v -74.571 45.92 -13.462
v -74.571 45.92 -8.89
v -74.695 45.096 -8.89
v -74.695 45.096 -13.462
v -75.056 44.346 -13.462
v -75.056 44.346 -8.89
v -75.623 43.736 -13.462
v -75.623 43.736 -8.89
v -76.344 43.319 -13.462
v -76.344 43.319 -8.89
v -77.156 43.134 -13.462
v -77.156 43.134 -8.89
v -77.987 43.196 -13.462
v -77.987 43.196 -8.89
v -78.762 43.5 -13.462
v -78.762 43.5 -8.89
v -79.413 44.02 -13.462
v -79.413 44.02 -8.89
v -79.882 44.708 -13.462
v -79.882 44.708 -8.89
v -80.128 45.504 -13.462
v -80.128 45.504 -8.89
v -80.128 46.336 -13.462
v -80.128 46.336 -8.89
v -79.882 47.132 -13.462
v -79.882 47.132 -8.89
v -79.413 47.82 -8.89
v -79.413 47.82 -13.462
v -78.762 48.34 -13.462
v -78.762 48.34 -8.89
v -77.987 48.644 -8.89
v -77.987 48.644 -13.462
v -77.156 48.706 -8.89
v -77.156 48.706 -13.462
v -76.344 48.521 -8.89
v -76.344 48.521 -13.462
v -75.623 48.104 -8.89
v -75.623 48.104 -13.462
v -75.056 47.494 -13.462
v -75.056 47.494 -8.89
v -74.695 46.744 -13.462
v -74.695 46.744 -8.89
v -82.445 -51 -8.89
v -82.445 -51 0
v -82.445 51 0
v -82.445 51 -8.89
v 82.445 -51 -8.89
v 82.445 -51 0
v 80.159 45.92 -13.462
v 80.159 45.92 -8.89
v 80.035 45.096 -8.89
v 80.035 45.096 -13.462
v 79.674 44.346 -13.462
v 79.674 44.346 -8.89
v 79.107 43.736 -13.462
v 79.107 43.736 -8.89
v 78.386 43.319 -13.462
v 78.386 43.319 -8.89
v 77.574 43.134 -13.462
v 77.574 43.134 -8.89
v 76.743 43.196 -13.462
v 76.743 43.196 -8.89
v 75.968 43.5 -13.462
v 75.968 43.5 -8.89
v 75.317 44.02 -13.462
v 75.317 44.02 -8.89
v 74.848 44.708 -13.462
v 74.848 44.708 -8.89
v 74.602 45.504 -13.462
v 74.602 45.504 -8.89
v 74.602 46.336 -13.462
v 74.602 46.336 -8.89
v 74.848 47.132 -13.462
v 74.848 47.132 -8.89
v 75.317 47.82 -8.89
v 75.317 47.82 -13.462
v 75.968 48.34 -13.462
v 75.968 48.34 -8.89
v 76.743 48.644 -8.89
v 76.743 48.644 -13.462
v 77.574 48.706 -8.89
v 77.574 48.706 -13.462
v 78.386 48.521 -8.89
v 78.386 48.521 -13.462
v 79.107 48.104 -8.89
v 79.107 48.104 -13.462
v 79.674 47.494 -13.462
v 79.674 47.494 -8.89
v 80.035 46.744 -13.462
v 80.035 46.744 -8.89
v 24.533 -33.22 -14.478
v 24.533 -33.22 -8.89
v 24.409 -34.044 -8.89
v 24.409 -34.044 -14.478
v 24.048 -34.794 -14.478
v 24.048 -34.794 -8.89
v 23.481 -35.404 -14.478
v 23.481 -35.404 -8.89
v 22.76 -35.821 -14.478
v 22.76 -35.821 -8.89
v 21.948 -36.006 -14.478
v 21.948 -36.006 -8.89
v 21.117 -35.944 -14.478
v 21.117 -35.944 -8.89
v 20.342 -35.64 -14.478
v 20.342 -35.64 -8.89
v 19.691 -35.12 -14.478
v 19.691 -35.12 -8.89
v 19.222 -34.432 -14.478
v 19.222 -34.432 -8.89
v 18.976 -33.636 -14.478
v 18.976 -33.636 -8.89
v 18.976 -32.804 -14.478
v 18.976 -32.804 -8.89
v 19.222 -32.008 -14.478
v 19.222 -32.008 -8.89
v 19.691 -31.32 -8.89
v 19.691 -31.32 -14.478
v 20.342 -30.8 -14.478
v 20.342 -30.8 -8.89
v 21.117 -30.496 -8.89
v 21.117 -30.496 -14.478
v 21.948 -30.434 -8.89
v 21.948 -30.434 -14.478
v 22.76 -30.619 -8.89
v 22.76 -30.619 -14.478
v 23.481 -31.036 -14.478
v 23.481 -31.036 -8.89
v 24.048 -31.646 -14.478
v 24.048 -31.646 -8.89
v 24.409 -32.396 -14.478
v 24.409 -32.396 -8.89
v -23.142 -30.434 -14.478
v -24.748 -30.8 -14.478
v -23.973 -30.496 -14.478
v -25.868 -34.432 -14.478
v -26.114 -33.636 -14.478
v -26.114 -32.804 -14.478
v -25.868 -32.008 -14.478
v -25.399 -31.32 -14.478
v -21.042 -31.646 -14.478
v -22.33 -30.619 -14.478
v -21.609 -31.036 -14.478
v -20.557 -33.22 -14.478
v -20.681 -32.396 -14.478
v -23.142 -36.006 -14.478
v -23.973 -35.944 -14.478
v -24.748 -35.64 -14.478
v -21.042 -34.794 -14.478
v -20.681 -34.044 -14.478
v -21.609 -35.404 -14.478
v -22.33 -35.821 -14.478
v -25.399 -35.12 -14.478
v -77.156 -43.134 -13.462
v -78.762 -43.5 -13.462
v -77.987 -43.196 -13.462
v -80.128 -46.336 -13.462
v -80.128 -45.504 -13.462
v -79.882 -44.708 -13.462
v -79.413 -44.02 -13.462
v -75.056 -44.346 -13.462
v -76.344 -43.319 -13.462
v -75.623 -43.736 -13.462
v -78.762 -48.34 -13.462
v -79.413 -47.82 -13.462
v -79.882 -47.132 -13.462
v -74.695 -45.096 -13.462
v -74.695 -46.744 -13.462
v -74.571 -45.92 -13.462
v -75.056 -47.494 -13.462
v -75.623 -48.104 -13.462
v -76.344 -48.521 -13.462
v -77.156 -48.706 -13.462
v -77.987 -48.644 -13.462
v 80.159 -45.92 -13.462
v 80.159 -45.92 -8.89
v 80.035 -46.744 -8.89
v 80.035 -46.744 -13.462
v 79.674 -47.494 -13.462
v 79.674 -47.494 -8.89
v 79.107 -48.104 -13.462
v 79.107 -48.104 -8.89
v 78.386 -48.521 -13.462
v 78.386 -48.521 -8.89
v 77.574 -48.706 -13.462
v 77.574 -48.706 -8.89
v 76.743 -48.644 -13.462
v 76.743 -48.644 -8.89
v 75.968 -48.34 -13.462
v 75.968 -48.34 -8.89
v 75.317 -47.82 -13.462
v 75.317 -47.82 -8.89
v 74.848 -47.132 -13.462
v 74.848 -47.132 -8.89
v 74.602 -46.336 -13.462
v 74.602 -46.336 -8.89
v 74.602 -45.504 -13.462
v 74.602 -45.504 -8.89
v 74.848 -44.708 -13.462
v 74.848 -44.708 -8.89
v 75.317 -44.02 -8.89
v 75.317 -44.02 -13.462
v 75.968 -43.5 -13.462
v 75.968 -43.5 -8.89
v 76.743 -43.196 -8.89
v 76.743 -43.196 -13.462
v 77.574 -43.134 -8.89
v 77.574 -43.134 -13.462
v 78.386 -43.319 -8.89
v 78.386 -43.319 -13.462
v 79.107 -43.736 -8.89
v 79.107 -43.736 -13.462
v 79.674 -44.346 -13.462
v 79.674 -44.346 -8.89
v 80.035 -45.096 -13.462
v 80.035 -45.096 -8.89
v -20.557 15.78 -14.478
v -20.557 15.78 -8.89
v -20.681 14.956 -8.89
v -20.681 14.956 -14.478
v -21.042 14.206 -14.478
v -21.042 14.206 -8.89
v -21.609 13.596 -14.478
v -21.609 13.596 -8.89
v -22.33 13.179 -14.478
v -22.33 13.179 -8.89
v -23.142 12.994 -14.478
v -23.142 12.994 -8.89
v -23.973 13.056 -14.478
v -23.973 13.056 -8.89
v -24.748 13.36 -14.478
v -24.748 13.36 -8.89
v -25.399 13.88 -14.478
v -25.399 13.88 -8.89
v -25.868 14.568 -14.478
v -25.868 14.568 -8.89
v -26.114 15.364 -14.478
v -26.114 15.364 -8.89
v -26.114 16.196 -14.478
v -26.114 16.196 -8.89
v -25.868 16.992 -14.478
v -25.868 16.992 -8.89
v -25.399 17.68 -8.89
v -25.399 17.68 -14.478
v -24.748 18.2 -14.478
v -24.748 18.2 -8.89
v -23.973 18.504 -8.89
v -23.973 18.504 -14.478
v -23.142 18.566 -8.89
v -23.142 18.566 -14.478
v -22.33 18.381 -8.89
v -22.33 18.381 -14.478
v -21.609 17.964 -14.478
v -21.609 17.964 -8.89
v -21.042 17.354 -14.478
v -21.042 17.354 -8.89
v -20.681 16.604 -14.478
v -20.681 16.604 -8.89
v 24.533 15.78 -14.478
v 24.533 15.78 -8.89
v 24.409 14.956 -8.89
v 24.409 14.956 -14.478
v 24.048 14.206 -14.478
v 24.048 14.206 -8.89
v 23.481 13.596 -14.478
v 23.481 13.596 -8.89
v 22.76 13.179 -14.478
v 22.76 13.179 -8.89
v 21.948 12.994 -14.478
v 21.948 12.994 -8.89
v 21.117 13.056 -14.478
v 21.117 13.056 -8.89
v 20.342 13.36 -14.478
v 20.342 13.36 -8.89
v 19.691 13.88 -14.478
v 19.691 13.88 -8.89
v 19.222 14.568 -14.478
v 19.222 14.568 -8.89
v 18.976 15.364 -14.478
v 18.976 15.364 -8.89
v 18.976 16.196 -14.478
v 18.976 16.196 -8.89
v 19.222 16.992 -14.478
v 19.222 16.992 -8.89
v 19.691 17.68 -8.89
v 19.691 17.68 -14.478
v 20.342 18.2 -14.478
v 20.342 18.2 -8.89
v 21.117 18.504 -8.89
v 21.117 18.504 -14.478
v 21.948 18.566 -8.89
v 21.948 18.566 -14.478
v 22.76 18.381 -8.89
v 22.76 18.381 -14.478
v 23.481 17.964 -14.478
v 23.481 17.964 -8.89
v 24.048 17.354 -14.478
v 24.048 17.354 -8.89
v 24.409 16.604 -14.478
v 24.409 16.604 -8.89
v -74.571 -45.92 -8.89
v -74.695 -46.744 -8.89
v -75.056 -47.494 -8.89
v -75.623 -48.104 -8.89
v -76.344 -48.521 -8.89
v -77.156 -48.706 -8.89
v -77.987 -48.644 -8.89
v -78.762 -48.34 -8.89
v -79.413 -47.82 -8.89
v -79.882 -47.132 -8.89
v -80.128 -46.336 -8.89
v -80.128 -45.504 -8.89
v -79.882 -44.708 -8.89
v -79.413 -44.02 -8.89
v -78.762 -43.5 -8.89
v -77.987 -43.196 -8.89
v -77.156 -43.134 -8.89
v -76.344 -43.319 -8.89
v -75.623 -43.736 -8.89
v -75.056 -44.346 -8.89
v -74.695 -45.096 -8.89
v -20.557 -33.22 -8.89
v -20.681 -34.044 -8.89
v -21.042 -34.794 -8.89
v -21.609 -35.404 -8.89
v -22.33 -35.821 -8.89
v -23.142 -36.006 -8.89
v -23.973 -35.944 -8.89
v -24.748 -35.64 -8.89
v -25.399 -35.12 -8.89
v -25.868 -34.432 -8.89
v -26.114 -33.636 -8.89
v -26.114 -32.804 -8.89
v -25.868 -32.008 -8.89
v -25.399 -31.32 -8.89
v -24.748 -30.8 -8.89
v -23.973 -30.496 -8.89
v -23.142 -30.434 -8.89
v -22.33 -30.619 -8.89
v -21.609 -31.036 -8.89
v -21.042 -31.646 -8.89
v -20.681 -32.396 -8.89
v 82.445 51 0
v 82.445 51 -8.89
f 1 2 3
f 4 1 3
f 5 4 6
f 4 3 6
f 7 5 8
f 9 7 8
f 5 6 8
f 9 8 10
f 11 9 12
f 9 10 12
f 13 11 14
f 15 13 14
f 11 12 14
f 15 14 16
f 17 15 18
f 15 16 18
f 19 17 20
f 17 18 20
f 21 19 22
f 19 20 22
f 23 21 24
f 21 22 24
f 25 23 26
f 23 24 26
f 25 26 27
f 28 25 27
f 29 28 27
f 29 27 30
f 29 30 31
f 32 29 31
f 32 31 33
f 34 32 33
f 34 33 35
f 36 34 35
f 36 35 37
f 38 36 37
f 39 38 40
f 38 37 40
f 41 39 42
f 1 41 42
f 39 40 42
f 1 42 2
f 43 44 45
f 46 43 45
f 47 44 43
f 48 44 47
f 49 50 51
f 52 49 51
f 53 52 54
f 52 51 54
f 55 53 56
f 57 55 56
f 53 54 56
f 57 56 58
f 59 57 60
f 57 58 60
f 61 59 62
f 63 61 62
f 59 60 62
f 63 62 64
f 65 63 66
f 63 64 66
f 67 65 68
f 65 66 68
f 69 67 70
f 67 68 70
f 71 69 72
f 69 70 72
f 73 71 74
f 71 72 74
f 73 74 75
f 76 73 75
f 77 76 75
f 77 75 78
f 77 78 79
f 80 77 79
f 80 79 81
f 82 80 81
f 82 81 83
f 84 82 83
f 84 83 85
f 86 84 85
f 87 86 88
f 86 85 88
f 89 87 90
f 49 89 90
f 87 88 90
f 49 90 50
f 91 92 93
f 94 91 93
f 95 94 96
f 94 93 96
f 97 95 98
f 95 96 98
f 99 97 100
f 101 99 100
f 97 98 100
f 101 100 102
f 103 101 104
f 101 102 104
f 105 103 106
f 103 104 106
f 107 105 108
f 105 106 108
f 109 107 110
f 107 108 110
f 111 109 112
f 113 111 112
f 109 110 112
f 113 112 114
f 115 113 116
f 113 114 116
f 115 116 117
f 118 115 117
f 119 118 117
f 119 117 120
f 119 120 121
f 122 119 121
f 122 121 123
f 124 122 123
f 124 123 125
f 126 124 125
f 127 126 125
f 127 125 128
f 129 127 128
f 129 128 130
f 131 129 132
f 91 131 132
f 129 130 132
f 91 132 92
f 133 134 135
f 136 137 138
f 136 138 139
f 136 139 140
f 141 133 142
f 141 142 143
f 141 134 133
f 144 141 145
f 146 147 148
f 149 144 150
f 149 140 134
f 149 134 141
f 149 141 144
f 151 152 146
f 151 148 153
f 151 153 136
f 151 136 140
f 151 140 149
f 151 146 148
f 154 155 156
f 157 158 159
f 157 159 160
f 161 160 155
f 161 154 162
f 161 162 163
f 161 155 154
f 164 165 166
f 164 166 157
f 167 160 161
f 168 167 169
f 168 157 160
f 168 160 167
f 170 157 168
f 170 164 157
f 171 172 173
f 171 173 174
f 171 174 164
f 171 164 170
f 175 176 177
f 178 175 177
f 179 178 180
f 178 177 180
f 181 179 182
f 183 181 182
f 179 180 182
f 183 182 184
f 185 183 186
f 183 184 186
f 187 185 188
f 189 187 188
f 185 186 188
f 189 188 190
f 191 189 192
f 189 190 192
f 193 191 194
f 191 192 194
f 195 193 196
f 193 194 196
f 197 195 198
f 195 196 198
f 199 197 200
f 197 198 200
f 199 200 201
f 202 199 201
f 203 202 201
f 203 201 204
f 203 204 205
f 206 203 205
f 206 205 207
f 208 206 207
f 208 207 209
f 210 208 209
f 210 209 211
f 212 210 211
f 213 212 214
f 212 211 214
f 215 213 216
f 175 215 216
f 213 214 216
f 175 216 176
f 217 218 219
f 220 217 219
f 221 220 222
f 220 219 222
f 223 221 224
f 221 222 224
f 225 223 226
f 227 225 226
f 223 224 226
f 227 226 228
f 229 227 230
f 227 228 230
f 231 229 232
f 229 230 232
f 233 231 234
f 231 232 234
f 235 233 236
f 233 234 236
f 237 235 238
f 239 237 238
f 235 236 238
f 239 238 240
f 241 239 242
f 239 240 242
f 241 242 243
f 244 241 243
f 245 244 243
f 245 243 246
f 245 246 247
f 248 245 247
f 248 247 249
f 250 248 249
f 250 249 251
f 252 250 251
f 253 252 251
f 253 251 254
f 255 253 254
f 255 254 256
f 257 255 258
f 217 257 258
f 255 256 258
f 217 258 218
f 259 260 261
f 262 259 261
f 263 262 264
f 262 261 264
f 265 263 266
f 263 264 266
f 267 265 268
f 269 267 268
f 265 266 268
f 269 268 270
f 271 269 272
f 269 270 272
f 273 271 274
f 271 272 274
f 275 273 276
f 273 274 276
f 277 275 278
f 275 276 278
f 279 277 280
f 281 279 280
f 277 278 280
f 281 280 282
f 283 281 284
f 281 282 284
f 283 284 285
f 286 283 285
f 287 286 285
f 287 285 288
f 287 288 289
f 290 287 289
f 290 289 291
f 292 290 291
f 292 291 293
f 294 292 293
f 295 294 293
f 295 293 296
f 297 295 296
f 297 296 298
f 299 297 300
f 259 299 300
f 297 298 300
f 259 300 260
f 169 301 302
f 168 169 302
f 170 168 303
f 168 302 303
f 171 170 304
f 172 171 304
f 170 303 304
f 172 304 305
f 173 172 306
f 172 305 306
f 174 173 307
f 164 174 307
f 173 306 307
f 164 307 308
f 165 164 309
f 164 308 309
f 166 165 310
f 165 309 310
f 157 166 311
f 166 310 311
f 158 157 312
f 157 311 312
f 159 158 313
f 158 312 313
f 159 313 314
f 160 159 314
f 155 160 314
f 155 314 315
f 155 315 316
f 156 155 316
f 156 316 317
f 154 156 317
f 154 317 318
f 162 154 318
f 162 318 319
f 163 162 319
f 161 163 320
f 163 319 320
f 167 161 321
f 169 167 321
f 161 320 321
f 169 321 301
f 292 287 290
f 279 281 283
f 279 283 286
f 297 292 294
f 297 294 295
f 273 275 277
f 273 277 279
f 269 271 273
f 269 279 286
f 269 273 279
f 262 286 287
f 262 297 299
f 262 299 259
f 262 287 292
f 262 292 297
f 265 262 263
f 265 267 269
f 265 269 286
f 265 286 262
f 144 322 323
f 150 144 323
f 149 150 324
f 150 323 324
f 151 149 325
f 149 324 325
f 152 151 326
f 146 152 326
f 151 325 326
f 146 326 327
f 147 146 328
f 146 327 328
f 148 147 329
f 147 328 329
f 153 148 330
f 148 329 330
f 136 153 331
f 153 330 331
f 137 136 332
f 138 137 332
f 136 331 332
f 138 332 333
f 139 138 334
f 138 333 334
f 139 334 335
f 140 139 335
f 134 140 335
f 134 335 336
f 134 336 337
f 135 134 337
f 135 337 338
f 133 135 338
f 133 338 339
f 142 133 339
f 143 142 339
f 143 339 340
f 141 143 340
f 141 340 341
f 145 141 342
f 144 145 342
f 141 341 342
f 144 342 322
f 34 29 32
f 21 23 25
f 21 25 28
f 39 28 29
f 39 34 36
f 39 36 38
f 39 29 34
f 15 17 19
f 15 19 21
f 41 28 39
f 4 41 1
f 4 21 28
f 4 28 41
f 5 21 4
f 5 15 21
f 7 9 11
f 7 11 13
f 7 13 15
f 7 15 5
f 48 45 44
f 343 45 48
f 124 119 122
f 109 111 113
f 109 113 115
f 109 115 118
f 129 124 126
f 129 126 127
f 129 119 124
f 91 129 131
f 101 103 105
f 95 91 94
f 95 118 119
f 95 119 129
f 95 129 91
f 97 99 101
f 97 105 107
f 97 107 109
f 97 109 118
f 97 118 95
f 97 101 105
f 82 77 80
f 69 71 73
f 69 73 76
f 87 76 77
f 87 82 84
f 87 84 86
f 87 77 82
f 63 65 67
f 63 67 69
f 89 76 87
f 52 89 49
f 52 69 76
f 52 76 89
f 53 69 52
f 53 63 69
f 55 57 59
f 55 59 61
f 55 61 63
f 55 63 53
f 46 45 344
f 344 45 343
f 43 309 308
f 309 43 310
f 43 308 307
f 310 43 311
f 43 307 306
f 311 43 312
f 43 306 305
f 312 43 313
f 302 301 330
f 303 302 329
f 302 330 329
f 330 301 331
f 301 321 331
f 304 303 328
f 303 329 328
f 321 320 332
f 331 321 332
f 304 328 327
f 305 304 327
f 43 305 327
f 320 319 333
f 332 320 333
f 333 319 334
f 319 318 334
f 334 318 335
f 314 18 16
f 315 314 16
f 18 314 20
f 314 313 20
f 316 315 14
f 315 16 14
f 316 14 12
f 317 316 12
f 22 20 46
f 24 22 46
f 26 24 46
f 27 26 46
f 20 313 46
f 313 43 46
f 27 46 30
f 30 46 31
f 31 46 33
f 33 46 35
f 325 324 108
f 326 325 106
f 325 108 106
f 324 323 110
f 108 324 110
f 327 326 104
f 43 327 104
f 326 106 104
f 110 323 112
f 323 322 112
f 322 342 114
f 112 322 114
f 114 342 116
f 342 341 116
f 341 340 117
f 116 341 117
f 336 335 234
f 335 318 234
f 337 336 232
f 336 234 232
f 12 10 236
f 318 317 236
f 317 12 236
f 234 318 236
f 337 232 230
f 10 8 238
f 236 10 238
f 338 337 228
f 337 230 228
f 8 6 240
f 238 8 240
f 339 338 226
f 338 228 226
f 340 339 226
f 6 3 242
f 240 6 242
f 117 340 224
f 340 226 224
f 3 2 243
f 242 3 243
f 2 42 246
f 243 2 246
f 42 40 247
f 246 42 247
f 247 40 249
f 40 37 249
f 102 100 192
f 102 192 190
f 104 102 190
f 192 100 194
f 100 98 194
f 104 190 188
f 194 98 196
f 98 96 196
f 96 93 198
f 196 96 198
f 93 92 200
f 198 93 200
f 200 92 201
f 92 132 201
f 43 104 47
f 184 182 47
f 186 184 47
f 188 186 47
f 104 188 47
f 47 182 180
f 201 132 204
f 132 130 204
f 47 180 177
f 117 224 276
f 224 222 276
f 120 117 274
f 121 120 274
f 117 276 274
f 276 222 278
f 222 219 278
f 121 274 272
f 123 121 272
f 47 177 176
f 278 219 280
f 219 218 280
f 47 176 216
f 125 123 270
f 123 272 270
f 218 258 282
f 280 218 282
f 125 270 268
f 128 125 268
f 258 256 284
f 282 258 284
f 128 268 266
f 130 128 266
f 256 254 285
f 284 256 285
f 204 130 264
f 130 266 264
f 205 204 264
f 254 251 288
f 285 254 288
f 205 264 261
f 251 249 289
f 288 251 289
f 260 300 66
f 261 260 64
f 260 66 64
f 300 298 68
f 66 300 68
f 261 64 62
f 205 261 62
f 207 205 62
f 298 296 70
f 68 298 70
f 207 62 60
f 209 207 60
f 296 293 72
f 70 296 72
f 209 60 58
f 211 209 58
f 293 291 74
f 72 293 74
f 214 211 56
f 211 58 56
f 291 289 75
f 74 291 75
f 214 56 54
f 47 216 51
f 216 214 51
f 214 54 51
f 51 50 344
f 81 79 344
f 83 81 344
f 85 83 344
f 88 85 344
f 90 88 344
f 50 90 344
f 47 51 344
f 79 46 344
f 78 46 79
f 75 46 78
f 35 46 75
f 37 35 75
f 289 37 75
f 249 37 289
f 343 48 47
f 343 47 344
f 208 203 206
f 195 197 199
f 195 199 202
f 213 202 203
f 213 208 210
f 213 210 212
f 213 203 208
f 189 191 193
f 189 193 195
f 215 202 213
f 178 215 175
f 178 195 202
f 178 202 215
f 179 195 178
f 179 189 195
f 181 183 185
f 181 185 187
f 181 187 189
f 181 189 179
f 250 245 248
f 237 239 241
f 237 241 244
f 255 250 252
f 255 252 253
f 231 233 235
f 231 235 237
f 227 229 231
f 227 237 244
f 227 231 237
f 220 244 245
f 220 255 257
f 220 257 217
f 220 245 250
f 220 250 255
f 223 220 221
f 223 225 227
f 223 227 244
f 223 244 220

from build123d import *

# Parameters (mm, degrees)
SKETCH1_W           = 164.89
SKETCH1_H           = 102
BOSS_EXTRUDE1_DEPTH = 8.89
SKETCH2_R           = 2.794
BOSS_EXTRUDE2_DEPTH = 4.572
SKETCH3_R           = 2.794
BOSS_EXTRUDE3_DEPTH = 5.588


with BuildPart() as part:
    # Sketch1 → Boss-Extrude1 (new body)
    with BuildSketch(Plane.XY):
        Rectangle(SKETCH1_W, SKETCH1_H)
    extrude(amount=-BOSS_EXTRUDE1_DEPTH)

    # Sketch2 → Boss-Extrude2 (add)
    with BuildSketch(Plane(origin=(0, 0, -8.89), x_dir=(-1, 0, 0), z_dir=(0, 0, -1))):
        with Locations(Location((-77.365, 45.92, 0), (0, 0, 180))):
            Circle(SKETCH2_R)
        with Locations(Location((77.365, 45.92, 0), (0, 0, 180))):
            Circle(SKETCH2_R)
        with Locations(Location((-77.365, -45.92, 0), (0, 0, 180))):
            Circle(SKETCH2_R)
        with Locations(Location((77.365, -45.92, 0), (0, 0, 180))):
            Circle(SKETCH2_R)
    extrude(amount=BOSS_EXTRUDE2_DEPTH)

    # Sketch3 → Boss-Extrude3 (add)
    with BuildSketch(Plane(origin=(0, 0, -8.89), x_dir=(-1, 0, 0), z_dir=(0, 0, -1))):
        with Locations(Location((-21.739, 15.78, 0), (0, 0, 180))):
            Circle(SKETCH3_R)
        with Locations(Location((-21.739, -33.22, 0), (0, 0, 180))):
            Circle(SKETCH3_R)
        with Locations(Location((23.351, -33.22, 0), (0, 0, 180))):
            Circle(SKETCH3_R)
        with Locations(Location((23.351, 15.78, 0), (0, 0, 180))):
            Circle(SKETCH3_R)
    extrude(amount=BOSS_EXTRUDE3_DEPTH)


solid = part.part
